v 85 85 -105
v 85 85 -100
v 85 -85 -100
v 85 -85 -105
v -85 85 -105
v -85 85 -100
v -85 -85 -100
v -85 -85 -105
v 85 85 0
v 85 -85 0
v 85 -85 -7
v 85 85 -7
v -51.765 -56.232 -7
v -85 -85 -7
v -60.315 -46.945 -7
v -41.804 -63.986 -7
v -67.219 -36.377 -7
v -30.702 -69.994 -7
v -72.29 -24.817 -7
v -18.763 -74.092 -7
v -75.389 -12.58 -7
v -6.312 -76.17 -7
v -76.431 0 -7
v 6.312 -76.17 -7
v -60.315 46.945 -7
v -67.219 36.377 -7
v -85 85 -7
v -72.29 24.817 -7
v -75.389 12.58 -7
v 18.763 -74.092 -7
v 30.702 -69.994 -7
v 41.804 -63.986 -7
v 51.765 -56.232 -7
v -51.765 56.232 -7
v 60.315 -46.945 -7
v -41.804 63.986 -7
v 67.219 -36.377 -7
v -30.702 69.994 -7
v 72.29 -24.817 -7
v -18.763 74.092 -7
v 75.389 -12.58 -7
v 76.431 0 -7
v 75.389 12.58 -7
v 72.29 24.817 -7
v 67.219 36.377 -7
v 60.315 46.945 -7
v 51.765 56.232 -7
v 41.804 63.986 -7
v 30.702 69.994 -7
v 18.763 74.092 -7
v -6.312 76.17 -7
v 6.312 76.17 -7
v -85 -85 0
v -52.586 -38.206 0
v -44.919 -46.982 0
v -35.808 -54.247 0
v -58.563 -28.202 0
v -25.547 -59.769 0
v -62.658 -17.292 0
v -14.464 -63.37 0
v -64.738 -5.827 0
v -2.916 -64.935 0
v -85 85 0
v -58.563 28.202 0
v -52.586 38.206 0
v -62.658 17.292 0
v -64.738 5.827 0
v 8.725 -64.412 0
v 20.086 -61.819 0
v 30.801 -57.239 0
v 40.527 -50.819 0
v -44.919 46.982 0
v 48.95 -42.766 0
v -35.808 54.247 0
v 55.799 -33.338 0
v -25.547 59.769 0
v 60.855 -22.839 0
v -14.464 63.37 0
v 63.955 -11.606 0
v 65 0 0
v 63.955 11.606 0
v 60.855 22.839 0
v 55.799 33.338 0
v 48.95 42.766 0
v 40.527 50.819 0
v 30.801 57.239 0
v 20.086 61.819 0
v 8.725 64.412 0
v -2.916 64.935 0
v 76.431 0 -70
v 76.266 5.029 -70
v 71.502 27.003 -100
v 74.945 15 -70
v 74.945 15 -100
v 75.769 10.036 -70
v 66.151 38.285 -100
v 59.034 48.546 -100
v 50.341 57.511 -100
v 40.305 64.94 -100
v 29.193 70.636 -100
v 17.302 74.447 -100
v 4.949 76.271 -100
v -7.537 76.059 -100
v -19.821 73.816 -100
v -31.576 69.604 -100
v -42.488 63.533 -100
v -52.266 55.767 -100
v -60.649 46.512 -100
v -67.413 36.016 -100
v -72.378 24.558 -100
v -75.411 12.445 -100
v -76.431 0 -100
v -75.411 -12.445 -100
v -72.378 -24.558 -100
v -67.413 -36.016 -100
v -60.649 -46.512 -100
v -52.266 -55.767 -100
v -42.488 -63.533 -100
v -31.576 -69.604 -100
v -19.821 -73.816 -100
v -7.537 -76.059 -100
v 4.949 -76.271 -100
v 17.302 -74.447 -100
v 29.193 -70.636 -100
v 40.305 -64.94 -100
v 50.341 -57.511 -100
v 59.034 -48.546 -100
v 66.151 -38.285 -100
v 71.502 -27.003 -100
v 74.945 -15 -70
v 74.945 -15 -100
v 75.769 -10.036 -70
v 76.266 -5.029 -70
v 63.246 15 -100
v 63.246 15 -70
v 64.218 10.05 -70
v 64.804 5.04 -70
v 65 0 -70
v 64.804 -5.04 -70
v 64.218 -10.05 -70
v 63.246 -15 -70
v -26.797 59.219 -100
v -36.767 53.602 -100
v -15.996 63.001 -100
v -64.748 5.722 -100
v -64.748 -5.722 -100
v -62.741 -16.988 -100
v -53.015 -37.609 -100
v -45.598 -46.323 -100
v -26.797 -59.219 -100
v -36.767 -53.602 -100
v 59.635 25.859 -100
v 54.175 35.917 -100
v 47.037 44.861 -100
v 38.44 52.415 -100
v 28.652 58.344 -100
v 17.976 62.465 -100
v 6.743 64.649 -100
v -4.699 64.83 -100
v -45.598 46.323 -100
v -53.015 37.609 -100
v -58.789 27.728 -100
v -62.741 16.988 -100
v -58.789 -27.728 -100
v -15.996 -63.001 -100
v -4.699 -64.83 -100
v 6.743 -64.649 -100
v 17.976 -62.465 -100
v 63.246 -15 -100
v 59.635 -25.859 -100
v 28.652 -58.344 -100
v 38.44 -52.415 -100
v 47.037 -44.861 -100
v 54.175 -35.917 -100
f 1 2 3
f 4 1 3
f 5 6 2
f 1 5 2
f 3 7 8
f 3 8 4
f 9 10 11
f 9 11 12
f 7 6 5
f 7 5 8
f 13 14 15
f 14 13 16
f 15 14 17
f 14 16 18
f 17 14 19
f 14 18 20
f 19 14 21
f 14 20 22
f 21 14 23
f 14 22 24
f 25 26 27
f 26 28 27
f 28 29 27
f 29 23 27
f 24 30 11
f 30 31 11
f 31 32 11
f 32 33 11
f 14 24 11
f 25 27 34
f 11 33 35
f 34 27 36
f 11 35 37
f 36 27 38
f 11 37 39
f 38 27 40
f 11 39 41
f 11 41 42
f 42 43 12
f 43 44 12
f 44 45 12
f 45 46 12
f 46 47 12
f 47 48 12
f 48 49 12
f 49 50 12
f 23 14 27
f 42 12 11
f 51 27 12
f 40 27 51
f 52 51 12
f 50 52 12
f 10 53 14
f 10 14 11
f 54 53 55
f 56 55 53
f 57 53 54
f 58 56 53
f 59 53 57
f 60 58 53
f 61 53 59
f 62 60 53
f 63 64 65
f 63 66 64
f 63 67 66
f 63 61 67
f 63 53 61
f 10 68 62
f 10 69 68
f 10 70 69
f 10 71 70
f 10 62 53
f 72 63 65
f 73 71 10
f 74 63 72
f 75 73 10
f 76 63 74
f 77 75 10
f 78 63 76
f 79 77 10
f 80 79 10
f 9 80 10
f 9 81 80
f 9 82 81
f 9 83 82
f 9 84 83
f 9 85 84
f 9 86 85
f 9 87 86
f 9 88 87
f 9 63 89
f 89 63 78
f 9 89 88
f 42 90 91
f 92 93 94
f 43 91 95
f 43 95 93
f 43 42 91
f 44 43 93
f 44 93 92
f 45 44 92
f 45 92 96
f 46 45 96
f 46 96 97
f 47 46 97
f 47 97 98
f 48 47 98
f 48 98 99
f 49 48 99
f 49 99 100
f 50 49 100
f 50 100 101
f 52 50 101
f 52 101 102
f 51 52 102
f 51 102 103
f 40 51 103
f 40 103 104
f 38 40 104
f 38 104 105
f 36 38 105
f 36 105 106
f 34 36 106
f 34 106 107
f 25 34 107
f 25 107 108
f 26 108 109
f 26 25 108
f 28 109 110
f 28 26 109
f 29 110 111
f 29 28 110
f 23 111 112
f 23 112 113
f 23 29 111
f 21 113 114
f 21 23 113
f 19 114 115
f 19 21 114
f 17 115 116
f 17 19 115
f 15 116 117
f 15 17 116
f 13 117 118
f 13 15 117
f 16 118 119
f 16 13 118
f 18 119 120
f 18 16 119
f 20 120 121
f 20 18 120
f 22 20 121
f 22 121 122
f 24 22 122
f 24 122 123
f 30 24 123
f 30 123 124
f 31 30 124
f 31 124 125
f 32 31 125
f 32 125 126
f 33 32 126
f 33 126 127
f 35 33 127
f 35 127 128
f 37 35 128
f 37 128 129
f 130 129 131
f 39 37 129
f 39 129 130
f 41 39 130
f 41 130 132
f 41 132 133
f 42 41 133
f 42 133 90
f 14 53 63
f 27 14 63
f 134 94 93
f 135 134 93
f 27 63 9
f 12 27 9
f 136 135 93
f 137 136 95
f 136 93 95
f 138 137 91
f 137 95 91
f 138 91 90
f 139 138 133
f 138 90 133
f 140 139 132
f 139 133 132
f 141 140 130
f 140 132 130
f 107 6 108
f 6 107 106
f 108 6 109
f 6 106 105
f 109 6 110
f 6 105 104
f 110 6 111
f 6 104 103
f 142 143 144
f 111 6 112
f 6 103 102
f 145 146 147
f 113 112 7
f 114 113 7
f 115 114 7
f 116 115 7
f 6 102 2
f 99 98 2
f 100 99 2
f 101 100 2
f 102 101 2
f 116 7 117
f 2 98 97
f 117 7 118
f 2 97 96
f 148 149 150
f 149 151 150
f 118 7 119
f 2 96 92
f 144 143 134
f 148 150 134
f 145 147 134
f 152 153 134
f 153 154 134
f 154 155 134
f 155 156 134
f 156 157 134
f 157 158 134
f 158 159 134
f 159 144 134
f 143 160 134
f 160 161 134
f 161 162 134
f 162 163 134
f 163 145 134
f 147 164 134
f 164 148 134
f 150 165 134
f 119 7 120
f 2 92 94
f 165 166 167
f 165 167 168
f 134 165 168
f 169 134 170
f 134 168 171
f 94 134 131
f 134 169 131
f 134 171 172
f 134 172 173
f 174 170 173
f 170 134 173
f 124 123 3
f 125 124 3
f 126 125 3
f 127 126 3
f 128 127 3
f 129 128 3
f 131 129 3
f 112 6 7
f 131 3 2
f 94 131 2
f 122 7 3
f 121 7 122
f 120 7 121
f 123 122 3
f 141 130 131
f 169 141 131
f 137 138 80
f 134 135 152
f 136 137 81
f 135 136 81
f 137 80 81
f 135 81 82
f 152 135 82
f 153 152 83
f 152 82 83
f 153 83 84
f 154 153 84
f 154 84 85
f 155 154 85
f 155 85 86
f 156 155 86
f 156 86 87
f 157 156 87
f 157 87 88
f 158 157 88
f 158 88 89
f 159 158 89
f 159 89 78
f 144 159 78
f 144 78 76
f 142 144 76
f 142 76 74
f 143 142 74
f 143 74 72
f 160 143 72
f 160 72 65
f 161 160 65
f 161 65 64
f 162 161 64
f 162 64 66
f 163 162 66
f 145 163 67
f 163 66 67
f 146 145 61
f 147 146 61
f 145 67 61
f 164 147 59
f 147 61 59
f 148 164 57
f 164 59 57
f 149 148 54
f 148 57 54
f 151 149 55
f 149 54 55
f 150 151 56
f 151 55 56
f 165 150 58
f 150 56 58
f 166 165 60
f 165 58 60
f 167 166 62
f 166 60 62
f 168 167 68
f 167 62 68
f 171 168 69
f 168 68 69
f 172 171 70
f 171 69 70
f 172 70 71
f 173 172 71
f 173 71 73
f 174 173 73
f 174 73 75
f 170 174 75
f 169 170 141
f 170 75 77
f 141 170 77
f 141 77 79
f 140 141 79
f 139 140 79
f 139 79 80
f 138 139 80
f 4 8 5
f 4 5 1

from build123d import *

# Parameters (mm, degrees)
F0_R     = 76.4311452349
F0_R_2   = 65
F1_DEPTH = 100
F0_W     = 170
F0_H     = 170
F2_DEPTH = 7
F3_W     = 170
F3_H     = 170
F4_DEPTH = 5
F6_DEPTH = 22.7544467966


with BuildPart() as f1:
    # F0 (on Top) → F1 (new body)
    with BuildSketch(Plane.XY):
        Circle(F0_R)
        Circle(F0_R_2, mode=Mode.SUBTRACT)
    extrude(amount=-F1_DEPTH)

    # F0 (on Top) → F2 (join)
    with BuildSketch(Plane.XY):
        Rectangle(F0_W, F0_H)
        Circle(F0_R, mode=Mode.SUBTRACT)
    extrude(amount=-F2_DEPTH)

    # F3 (on face) → F4 (join)
    with BuildSketch(Plane(origin=(0, 0, -100), x_dir=(1, 0, 0), z_dir=(0, 0, -1))):
        Rectangle(F3_W, F3_H)
    extrude(amount=F4_DEPTH)

    # F5 (on face) → F6 (cut, up to face)
    with BuildSketch(Plane.YZ.offset(85)):
        Polygon((-15, -100), (15, -100), (15, -70), (0, -70), (-15, -70), align=None)
    extrude(amount=-F6_DEPTH, mode=Mode.SUBTRACT)


solid = f1.part
